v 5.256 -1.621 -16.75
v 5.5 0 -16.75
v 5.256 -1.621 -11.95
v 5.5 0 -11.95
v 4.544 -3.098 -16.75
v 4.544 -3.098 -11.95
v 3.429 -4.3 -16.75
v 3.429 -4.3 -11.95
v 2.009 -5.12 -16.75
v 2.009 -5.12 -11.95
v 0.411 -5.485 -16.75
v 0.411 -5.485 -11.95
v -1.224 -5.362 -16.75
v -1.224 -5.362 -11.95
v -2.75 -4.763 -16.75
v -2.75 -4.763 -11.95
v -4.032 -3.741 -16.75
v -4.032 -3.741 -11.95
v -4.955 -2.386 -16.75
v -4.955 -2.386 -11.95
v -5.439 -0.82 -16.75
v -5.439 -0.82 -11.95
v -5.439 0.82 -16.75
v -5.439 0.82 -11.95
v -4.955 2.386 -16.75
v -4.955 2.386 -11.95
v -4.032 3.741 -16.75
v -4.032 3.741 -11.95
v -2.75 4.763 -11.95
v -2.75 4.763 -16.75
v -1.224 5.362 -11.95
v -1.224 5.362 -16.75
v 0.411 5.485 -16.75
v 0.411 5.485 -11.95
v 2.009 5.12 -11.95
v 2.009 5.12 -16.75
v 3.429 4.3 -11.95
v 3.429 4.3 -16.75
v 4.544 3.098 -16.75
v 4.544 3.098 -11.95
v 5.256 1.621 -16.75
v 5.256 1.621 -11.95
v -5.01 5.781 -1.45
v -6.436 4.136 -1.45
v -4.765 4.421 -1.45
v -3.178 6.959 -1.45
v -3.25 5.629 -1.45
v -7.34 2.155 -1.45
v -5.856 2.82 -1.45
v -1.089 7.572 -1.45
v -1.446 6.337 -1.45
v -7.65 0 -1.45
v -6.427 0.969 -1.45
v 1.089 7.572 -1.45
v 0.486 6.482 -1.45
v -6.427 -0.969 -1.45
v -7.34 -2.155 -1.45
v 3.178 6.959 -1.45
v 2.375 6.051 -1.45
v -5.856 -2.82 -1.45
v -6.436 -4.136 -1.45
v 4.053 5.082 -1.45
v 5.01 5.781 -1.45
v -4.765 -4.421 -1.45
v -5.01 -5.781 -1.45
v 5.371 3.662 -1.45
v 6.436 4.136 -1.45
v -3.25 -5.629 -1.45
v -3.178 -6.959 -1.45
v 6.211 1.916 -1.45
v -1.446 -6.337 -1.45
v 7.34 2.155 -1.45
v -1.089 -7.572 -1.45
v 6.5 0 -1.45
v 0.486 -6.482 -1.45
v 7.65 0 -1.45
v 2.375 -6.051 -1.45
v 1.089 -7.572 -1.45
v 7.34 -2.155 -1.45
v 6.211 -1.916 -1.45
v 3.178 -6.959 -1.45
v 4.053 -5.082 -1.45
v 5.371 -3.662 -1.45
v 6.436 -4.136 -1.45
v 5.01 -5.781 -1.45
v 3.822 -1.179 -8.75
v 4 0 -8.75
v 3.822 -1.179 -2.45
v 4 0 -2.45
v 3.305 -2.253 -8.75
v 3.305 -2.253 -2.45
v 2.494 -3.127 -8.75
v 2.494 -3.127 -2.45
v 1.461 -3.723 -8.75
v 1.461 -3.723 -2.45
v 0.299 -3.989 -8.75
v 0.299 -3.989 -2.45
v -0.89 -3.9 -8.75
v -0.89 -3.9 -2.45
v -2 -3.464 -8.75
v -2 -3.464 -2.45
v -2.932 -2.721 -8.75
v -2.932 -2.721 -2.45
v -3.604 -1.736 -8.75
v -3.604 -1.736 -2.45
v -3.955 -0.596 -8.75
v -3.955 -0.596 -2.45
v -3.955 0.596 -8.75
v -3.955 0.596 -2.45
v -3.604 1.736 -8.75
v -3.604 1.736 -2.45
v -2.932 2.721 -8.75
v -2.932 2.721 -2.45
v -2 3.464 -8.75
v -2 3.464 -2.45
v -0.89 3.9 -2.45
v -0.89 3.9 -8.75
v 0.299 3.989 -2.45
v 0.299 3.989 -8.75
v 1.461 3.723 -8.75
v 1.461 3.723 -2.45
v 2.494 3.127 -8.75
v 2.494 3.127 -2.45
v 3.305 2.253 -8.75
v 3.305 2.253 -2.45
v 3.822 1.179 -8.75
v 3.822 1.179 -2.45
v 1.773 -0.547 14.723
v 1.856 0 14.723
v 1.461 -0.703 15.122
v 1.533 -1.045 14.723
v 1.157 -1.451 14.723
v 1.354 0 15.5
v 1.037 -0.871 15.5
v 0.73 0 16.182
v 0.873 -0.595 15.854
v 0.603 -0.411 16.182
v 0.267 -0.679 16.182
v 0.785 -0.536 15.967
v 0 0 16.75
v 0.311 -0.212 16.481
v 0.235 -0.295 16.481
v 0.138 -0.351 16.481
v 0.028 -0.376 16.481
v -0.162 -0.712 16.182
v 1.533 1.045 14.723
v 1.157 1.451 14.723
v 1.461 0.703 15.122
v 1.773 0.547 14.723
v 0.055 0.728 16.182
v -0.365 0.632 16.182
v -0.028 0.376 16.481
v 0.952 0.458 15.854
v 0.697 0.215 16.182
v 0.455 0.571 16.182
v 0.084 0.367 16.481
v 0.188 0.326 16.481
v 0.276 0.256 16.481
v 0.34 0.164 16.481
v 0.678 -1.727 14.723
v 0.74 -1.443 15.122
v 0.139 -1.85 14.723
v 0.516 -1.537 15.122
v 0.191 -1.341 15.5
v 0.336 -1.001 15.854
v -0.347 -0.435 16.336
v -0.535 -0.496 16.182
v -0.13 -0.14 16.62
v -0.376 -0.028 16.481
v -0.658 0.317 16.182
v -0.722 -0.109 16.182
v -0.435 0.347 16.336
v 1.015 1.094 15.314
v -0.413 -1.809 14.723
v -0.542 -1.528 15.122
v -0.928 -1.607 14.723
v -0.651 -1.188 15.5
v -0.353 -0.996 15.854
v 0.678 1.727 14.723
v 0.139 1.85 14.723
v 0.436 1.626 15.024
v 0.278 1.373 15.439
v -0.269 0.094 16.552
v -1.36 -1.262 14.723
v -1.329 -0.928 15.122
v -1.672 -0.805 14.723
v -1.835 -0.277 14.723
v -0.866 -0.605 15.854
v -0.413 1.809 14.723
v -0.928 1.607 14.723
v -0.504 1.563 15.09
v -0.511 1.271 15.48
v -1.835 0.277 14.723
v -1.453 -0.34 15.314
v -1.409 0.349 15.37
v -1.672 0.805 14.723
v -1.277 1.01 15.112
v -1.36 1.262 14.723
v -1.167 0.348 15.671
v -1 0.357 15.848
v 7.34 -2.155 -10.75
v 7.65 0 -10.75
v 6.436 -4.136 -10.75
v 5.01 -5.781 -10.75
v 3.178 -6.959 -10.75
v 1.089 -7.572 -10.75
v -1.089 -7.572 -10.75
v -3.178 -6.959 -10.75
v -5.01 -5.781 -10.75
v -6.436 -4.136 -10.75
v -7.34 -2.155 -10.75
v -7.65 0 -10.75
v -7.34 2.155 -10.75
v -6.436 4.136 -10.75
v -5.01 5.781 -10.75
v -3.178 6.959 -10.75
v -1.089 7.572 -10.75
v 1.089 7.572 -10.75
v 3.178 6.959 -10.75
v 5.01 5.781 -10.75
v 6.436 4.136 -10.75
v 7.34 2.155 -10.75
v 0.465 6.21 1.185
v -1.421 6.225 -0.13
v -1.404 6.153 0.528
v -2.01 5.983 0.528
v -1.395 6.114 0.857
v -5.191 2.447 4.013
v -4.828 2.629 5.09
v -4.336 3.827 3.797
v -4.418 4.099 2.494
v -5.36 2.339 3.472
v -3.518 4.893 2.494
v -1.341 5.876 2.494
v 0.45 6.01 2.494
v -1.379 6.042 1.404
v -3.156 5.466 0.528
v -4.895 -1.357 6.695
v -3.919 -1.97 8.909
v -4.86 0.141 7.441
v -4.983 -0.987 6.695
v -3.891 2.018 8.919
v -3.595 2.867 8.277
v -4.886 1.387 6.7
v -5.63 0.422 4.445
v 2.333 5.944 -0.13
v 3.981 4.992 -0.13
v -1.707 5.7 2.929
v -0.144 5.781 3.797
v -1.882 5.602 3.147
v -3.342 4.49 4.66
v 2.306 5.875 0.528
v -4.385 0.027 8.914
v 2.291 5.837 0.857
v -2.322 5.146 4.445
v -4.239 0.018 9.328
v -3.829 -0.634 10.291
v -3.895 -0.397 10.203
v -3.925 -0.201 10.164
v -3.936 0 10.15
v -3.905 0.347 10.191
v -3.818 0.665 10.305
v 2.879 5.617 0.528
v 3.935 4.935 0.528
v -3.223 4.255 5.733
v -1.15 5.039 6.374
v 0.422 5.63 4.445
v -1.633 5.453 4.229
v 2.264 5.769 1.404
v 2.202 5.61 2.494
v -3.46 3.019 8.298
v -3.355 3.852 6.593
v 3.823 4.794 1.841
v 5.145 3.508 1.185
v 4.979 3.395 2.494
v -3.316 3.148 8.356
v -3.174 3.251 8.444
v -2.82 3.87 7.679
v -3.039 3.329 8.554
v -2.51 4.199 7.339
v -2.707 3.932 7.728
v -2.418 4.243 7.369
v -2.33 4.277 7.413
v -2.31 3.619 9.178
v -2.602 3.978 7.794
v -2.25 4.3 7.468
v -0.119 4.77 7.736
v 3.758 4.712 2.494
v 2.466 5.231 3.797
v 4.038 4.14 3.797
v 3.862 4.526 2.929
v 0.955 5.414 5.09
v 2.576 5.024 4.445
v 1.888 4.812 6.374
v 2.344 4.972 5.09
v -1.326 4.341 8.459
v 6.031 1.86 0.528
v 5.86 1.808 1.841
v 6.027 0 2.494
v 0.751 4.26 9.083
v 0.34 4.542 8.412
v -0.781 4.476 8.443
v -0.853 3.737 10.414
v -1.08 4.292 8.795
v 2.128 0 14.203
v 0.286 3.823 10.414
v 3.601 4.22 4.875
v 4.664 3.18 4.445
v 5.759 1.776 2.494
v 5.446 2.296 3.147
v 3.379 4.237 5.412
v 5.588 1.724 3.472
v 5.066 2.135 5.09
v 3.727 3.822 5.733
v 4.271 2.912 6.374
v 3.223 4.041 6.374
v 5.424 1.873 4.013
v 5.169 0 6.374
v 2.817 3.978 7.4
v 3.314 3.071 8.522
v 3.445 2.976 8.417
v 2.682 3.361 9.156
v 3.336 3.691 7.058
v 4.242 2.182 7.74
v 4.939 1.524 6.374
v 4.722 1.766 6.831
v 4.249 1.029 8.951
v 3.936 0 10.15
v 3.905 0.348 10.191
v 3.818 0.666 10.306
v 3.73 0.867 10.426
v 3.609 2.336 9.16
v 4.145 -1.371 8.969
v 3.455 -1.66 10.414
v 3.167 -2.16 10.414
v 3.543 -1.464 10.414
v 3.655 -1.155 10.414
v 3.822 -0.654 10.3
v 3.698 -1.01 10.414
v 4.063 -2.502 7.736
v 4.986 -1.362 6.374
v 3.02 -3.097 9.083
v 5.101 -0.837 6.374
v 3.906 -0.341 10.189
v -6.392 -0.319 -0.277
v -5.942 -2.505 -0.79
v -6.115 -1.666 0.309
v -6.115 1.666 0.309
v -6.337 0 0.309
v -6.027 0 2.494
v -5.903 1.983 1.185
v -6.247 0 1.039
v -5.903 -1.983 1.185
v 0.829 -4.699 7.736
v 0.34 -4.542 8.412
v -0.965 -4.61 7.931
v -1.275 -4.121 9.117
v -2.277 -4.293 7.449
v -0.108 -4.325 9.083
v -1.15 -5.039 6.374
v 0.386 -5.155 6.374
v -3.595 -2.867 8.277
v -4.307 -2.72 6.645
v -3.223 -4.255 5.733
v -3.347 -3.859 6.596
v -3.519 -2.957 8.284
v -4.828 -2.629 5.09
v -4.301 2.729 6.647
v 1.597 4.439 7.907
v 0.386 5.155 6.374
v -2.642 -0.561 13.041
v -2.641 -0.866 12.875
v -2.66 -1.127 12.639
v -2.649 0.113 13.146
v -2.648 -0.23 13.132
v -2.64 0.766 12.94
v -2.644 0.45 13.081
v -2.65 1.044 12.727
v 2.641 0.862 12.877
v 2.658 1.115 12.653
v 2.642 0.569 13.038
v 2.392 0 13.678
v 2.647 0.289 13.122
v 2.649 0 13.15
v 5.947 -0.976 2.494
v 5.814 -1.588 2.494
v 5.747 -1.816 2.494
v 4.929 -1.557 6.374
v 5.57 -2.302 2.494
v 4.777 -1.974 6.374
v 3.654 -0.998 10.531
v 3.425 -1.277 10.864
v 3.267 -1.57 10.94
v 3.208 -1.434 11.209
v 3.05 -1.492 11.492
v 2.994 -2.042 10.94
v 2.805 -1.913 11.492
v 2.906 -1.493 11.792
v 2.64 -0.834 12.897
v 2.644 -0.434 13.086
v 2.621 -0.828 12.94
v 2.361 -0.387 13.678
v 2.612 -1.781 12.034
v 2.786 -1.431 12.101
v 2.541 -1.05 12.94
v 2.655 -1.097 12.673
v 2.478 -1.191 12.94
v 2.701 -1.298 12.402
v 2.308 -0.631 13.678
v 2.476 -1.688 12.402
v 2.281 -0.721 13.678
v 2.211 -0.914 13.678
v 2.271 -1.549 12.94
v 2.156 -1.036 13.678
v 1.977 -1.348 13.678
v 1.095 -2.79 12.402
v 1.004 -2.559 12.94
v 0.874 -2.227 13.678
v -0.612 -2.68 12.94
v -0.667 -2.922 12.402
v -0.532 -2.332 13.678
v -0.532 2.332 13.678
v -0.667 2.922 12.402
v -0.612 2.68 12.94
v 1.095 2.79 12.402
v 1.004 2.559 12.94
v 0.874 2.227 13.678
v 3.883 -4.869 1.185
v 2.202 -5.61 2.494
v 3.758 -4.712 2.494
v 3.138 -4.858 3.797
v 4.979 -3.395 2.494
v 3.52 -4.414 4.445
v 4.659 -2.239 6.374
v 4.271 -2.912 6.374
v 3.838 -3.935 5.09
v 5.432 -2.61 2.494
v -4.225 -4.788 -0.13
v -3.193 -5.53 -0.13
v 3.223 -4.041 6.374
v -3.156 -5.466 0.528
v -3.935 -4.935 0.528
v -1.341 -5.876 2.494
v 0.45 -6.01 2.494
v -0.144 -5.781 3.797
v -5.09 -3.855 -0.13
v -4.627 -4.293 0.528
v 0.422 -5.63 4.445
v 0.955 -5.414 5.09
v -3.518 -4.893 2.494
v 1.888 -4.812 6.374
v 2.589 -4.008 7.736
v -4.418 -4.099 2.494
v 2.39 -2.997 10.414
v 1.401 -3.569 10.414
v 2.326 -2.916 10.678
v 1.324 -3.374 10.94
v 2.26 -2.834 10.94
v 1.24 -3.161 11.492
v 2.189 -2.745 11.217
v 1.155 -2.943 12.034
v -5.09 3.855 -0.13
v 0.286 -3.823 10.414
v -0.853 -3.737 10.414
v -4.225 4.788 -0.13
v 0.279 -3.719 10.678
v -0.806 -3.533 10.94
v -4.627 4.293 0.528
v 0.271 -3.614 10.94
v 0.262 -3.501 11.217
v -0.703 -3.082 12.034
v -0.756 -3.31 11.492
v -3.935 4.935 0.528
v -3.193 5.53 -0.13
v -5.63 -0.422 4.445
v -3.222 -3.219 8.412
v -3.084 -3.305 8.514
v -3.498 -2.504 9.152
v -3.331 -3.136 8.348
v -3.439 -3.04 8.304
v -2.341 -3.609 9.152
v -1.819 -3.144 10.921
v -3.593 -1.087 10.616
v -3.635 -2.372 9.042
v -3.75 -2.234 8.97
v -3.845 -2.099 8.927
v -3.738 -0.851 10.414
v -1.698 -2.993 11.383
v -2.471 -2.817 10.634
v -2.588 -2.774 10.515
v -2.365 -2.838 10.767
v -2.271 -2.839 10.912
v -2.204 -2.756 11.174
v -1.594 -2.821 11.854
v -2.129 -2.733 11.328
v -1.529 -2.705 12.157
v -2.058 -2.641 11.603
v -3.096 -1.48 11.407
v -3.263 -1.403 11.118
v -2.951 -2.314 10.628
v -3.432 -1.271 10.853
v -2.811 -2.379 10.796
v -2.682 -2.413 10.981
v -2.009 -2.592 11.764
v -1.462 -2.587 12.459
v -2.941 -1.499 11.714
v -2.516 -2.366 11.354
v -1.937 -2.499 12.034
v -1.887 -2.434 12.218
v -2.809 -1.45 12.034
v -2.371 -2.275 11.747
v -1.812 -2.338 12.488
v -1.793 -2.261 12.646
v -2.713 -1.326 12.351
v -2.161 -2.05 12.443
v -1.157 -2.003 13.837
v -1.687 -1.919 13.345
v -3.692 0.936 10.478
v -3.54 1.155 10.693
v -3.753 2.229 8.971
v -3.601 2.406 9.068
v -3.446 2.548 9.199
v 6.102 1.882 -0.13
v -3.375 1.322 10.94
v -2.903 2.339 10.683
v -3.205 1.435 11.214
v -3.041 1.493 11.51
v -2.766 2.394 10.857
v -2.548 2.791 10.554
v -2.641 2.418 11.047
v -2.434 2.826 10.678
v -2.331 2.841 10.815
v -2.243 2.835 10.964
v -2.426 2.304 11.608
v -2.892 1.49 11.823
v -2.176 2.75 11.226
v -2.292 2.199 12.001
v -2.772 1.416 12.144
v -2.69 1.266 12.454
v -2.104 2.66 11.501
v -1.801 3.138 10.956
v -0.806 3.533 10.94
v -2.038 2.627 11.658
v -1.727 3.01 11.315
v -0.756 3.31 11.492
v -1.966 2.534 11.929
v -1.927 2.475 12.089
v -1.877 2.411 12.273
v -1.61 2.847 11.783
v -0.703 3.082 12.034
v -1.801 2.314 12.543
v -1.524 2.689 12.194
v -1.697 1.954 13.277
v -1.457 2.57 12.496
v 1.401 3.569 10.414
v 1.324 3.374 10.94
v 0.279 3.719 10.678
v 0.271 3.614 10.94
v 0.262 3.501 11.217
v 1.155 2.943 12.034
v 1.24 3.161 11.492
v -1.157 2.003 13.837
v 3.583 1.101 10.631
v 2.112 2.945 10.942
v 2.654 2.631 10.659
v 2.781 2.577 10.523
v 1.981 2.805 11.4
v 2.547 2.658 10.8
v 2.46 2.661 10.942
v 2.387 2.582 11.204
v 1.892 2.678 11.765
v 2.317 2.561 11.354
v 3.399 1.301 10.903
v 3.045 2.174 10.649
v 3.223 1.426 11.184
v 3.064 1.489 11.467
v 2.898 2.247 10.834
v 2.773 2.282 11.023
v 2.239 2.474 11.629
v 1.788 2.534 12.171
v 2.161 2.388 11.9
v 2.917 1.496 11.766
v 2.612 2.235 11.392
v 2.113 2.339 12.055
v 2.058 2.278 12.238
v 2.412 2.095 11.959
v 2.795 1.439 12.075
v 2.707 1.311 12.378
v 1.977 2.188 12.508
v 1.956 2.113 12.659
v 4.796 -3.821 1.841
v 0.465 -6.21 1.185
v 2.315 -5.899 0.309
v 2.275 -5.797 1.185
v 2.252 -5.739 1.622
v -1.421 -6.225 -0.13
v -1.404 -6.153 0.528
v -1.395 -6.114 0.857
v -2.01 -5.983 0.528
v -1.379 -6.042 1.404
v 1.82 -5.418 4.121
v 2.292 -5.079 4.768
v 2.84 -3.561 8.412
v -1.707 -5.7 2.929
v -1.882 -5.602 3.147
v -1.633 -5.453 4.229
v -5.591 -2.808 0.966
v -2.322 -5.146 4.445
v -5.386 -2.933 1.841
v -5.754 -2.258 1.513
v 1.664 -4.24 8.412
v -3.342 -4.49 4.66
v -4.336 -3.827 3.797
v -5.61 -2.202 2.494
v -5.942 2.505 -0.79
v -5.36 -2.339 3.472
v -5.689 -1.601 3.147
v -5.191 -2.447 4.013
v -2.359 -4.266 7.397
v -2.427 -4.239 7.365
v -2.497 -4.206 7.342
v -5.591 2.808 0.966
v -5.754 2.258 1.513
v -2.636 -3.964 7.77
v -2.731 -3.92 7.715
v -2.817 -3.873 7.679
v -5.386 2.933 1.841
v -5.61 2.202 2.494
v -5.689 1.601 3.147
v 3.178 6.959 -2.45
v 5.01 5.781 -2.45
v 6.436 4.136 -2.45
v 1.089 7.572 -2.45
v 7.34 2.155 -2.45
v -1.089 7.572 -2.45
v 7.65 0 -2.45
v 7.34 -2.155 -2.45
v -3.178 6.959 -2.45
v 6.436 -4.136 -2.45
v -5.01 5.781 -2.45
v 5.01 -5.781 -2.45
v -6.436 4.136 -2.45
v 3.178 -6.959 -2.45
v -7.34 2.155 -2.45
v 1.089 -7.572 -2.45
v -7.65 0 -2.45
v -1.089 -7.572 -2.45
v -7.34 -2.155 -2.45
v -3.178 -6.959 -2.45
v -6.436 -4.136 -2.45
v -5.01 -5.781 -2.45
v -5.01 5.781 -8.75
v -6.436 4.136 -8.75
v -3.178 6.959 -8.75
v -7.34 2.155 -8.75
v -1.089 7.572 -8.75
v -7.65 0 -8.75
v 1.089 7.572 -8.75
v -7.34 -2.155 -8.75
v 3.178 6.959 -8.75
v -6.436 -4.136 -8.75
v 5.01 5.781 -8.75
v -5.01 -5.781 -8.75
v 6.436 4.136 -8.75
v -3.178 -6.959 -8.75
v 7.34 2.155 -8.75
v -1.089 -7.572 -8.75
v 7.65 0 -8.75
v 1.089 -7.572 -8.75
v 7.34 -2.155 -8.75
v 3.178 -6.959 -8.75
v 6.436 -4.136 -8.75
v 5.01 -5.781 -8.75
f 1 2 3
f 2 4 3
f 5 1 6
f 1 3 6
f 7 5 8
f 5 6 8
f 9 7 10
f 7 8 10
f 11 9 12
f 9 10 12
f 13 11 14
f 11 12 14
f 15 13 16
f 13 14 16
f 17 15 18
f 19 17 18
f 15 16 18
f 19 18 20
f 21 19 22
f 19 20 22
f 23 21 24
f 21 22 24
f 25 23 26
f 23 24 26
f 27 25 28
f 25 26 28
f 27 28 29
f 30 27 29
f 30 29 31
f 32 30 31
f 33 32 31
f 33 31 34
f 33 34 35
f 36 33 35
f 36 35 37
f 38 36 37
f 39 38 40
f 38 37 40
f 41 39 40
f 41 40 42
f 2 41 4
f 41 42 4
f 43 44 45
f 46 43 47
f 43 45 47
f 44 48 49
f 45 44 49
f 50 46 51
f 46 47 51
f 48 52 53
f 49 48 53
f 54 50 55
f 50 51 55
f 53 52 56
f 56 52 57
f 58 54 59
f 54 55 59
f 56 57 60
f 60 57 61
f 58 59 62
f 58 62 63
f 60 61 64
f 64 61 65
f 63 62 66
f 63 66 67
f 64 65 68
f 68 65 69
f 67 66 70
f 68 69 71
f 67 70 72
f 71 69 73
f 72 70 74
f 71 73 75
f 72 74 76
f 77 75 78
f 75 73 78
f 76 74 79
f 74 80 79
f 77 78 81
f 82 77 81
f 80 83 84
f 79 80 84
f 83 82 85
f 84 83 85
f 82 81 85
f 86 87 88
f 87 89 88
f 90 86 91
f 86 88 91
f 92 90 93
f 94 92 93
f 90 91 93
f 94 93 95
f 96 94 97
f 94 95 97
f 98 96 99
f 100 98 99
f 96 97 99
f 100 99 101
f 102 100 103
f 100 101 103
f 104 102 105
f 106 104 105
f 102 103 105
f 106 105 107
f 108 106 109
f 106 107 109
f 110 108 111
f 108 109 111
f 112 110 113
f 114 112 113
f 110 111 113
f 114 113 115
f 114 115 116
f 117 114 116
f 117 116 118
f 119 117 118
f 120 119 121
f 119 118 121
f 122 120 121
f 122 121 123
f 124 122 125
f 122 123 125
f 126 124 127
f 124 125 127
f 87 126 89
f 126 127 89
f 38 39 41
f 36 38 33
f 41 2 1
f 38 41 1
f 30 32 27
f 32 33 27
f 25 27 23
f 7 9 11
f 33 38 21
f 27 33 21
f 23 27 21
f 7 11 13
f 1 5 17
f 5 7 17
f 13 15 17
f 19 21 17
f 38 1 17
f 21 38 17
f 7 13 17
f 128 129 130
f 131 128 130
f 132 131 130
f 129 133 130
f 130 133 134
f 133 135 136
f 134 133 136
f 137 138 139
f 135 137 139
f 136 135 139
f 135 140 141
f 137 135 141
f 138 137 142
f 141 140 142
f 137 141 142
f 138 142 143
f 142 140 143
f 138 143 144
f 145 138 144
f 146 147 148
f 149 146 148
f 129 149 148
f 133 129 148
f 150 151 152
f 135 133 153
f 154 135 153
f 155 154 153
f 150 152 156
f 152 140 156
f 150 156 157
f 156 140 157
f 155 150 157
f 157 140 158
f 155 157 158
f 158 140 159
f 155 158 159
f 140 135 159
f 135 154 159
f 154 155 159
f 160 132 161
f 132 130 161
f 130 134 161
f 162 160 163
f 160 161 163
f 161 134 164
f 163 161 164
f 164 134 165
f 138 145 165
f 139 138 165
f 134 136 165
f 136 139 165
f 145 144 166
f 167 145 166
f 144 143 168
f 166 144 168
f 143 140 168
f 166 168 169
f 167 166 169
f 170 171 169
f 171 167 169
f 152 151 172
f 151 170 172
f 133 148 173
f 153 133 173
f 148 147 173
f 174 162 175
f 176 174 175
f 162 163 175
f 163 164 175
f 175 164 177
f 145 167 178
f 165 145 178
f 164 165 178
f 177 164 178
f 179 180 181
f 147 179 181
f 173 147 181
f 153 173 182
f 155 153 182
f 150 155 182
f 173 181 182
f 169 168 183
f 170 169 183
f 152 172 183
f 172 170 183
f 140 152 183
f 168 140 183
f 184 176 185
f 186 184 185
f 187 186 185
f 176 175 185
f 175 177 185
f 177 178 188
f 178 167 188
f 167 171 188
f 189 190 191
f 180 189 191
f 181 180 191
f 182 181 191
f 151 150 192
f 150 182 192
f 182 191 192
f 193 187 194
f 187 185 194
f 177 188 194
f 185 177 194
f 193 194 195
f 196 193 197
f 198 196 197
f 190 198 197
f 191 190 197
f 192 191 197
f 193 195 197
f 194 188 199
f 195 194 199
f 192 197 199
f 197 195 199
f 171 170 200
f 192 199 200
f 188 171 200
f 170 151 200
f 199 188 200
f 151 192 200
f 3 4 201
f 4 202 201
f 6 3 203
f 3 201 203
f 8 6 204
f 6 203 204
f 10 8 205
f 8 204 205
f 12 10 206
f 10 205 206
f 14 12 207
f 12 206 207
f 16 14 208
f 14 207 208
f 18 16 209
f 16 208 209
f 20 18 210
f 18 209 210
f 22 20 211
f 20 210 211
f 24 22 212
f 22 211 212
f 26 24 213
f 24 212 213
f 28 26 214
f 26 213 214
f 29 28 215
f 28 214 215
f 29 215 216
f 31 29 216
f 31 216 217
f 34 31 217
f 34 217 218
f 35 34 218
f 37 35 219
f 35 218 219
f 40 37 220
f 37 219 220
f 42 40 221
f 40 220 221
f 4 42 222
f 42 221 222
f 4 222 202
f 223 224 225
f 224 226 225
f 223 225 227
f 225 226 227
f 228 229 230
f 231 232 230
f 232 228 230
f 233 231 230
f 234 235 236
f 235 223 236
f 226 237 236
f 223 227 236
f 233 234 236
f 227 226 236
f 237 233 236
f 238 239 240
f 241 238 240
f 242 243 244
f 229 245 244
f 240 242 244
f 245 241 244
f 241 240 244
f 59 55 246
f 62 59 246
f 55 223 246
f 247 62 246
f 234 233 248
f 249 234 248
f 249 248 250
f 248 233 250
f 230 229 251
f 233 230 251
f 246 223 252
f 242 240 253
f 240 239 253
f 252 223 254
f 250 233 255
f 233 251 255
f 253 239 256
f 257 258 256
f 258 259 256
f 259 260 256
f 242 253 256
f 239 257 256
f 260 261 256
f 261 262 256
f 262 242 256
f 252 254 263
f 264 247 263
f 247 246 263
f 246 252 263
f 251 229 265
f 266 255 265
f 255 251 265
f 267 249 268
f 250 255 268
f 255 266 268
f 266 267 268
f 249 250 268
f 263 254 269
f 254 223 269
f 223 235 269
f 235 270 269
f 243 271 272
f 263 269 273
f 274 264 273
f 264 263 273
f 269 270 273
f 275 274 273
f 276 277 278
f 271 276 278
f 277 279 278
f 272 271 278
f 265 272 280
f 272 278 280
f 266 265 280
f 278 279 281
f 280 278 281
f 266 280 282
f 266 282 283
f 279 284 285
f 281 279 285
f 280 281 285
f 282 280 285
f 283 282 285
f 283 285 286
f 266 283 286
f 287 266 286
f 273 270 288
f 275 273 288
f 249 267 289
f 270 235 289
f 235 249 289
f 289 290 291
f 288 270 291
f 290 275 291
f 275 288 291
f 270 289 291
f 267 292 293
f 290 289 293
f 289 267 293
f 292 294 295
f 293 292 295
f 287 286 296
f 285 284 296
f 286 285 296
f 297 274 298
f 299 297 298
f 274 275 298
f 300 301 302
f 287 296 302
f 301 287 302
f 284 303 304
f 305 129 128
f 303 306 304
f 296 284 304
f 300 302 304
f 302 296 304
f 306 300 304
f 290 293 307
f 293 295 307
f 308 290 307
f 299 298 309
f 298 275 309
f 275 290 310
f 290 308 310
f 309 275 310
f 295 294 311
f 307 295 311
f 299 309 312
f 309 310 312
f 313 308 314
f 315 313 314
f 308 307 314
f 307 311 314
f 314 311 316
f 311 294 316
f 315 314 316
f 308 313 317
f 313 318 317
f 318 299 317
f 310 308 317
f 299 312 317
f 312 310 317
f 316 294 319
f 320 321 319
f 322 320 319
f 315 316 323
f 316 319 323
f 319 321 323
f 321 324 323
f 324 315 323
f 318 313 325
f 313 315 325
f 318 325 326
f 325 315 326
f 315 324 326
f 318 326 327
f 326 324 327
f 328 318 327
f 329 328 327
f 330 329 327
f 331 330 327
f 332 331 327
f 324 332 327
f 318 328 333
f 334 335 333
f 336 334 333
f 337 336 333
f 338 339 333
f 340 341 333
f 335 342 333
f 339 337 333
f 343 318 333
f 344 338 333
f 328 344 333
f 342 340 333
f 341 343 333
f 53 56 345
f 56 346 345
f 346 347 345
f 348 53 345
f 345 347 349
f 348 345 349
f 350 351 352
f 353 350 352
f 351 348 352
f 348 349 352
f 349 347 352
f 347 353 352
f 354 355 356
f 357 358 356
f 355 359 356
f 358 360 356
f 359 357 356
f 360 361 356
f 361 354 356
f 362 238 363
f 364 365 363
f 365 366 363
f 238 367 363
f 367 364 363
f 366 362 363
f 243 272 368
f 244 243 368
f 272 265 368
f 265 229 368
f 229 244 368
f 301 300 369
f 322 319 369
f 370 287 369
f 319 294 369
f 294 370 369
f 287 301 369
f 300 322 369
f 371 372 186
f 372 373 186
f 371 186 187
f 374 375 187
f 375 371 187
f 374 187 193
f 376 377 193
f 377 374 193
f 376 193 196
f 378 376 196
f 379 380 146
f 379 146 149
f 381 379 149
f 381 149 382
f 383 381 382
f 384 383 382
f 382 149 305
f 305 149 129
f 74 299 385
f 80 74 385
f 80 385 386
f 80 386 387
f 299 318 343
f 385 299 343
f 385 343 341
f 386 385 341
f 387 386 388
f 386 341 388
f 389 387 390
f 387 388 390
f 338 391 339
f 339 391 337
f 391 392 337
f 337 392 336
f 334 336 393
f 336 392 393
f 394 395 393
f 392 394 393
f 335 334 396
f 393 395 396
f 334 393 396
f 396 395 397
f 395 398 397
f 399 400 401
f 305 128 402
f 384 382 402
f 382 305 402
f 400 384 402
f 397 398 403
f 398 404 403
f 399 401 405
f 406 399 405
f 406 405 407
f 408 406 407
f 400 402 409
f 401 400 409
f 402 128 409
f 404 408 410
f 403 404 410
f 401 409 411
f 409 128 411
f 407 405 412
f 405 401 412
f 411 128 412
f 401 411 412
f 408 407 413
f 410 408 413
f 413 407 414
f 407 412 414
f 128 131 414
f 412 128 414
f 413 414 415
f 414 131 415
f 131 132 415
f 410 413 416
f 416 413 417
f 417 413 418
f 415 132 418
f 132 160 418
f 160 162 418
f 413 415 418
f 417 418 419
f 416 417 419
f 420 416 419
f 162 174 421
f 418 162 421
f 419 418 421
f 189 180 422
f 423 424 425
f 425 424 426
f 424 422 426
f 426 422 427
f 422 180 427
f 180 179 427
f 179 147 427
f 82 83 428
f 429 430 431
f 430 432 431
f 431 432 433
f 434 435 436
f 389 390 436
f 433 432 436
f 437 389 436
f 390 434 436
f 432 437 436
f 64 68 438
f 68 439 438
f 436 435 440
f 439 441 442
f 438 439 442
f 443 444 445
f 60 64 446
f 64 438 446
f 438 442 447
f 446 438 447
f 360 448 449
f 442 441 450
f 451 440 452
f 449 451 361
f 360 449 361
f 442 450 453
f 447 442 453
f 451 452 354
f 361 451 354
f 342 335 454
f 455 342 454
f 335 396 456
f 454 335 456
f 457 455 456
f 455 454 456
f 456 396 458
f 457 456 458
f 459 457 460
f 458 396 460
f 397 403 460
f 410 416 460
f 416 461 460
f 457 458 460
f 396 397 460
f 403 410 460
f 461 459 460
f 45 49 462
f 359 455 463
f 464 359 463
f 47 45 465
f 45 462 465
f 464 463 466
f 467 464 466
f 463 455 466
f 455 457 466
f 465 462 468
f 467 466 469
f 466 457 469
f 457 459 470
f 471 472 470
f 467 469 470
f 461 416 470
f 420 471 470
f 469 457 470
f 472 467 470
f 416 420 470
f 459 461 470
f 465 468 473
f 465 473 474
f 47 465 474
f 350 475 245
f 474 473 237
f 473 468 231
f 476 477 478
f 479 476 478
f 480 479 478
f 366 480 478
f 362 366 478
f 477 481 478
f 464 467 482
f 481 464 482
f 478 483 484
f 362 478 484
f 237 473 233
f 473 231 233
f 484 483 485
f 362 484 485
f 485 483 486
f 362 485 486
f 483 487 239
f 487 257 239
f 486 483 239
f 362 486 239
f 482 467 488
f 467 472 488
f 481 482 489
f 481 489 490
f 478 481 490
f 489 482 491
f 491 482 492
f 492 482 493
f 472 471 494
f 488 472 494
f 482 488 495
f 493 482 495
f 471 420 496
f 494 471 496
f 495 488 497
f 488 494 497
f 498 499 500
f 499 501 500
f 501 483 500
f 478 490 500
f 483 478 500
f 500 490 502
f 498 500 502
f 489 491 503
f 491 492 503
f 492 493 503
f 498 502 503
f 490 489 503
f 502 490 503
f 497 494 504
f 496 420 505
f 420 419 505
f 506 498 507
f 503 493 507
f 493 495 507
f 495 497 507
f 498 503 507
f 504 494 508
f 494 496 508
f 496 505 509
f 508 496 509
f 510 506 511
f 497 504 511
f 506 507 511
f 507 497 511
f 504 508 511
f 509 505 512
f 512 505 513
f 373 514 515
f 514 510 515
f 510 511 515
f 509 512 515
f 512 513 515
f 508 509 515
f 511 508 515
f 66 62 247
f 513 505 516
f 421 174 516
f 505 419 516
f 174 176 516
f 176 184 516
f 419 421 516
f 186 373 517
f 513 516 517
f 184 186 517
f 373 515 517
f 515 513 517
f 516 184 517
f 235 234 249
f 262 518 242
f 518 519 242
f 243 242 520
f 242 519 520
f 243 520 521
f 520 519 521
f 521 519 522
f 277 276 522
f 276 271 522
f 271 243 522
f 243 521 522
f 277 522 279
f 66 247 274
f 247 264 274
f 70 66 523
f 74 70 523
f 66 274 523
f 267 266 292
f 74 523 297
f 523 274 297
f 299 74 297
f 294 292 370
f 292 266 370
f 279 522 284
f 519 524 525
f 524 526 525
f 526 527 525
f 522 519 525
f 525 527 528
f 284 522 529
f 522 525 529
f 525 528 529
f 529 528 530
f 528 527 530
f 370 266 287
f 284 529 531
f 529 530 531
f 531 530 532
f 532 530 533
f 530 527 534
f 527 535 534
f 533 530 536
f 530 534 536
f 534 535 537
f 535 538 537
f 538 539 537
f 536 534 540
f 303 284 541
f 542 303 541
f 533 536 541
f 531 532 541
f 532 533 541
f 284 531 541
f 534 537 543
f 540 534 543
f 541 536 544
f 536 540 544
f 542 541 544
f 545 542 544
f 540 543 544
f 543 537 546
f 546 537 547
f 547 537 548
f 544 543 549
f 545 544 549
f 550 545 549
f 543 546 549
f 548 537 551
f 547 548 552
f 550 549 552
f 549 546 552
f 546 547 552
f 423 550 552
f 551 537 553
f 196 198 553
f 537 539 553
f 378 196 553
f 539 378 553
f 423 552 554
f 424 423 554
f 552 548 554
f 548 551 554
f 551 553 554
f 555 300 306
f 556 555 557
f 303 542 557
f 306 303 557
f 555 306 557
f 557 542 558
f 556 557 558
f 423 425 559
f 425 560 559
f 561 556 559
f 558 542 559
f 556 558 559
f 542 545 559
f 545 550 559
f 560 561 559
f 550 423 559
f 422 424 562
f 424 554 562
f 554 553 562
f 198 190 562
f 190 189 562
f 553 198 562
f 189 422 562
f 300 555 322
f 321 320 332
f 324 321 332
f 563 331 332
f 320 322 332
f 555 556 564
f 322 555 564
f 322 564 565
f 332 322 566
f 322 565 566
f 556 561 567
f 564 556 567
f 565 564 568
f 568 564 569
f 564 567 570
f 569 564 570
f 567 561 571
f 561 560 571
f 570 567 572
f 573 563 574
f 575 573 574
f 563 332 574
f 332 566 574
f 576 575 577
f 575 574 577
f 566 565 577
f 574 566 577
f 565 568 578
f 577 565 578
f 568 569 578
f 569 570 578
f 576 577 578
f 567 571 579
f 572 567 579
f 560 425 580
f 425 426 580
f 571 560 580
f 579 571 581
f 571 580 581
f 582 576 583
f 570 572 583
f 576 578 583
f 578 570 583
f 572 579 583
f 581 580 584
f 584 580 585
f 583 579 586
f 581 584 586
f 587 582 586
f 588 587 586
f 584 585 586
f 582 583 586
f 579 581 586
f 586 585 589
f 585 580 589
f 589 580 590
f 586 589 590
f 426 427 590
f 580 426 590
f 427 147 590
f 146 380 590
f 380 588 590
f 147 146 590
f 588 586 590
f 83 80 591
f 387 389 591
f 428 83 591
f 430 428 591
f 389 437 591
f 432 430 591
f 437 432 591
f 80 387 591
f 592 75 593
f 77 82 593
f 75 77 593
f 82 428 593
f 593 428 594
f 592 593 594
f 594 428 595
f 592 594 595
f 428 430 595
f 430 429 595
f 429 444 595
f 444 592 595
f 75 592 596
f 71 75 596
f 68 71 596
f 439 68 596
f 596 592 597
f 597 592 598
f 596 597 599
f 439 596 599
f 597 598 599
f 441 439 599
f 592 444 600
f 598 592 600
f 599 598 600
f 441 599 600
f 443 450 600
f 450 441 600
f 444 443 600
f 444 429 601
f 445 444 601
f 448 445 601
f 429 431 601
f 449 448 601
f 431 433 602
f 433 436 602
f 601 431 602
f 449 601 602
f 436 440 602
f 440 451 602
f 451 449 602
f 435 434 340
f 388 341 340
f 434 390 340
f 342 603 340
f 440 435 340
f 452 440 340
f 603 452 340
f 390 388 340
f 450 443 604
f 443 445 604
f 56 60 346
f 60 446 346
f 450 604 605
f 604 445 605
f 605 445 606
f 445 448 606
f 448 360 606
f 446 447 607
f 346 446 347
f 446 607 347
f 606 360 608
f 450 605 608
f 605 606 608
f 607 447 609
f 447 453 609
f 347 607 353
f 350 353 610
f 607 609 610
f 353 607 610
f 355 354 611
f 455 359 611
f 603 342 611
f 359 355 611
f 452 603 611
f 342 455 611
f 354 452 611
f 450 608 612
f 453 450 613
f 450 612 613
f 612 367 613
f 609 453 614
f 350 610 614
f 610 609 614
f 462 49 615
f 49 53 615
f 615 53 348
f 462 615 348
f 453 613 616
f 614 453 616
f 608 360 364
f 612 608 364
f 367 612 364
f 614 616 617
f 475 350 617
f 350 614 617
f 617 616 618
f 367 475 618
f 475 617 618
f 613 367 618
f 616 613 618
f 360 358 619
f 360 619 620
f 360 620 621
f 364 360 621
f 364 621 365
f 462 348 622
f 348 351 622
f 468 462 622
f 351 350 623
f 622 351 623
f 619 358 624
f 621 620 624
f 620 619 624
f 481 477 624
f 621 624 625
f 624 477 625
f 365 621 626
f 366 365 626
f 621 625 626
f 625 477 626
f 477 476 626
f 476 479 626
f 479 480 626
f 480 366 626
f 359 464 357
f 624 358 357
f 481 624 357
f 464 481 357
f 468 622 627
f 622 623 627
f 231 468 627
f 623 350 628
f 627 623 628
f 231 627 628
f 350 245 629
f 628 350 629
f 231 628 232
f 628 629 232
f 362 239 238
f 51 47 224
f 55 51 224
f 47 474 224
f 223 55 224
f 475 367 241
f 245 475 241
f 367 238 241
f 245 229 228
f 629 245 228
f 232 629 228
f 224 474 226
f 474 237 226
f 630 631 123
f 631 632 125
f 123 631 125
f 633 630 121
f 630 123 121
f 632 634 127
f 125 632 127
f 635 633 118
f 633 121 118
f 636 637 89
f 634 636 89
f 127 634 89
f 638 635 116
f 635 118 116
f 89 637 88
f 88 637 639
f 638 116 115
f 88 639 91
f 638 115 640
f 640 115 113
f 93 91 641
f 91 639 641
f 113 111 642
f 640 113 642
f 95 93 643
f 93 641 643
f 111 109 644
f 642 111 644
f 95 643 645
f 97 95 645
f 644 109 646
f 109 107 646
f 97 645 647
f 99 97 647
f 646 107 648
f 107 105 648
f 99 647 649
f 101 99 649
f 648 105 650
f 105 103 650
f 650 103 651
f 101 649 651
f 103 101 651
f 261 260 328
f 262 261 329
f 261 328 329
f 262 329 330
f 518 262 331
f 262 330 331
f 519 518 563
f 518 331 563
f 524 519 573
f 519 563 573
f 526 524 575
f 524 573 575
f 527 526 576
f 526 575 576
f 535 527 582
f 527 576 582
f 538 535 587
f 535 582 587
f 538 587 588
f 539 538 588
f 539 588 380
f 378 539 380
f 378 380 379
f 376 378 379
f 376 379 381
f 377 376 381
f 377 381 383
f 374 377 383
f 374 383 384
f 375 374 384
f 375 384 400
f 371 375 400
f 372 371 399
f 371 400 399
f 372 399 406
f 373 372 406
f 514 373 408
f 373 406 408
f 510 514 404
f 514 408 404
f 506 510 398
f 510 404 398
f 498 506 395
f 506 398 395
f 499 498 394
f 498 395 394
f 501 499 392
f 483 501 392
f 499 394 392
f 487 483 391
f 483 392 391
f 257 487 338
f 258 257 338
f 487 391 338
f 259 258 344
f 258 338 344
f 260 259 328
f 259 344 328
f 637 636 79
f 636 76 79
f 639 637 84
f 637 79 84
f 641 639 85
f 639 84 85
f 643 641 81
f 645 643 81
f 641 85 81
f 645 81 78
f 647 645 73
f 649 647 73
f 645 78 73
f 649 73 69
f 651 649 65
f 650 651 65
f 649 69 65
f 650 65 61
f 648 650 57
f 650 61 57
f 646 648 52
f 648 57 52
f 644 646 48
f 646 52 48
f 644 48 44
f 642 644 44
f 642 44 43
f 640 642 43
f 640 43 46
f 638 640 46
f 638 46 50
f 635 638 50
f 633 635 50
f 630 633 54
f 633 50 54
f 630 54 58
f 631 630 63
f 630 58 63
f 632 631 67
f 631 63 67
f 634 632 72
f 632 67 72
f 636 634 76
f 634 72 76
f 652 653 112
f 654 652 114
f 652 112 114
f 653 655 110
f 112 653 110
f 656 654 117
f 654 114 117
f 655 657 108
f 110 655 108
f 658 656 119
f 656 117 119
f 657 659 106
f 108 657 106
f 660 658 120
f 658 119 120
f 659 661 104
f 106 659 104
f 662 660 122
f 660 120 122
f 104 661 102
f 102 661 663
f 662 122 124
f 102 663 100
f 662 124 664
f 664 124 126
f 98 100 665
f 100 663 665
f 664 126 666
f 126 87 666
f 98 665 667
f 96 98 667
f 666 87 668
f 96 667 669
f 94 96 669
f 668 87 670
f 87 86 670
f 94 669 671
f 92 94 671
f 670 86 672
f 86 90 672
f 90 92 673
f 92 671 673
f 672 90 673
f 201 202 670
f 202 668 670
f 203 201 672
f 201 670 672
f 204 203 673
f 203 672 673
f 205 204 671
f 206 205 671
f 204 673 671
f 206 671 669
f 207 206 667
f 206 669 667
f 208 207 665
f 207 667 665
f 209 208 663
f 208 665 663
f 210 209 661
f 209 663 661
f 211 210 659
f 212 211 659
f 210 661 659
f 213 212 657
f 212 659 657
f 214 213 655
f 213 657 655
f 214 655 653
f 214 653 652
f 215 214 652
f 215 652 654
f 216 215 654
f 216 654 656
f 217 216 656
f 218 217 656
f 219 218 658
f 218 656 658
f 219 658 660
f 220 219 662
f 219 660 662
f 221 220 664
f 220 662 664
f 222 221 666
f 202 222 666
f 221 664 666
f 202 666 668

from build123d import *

# Parameters (mm, degrees)
SKETCH_2_R          = 1.5
CUT_EXTRUDE_1_DEPTH = 24.941073563


with BuildPart() as part:
    # Эскиз1 → Повернуть1 (revolve)
    with BuildSketch(Plane(origin=(0, 0, 0), x_dir=(0, 0, -1), z_dir=(1, 0, 0)), mode=Mode.PRIVATE) as revolve_1_sk:
        with BuildLine():
            Line((-16.75, 0), (16.75, 0))
            Line((16.75, 0), (16.75, 5.5))
            Line((16.75, 5.5), (11.95, 5.5))
            Line((11.95, 5.5), (10.75, 7.65))
            Line((10.75, 7.65), (8.75, 7.65))
            Line((8.75, 7.65), (8.75, 4))
            Line((8.75, 4), (2.45, 4))
            Line((2.45, 4), (2.45, 7.65))
            Line((2.45, 7.65), (1.45, 7.65))
            Line((1.45, 7.65), (1.45, 6.5))
            ThreePointArc((1.45, 6.5), (-6.880526727, 5.027063991), (-14.723327208, 1.855676812))
            ThreePointArc((-14.723327208, 1.855676812), (-15.854421467, 1.056447361), (-16.75, 0))
        make_face()
    revolve(revolve_1_sk.sketch.rotate(Axis((0, 0, -16.75), (0, 0, -1)), 90), axis=Axis((0, 0, -16.75), (0, 0, -1)))

    # Эскиз2 → Вырез-Вытянуть1 (cut, through all)
    with BuildSketch(Plane(origin=(7.65, 0, 0), x_dir=(0, 0, -1), z_dir=(1, 0, 0))):
        with Locations((-11.65, 0)):
            Circle(SKETCH_2_R)
    extrude(amount=-CUT_EXTRUDE_1_DEPTH, mode=Mode.SUBTRACT)


solid = part.part
